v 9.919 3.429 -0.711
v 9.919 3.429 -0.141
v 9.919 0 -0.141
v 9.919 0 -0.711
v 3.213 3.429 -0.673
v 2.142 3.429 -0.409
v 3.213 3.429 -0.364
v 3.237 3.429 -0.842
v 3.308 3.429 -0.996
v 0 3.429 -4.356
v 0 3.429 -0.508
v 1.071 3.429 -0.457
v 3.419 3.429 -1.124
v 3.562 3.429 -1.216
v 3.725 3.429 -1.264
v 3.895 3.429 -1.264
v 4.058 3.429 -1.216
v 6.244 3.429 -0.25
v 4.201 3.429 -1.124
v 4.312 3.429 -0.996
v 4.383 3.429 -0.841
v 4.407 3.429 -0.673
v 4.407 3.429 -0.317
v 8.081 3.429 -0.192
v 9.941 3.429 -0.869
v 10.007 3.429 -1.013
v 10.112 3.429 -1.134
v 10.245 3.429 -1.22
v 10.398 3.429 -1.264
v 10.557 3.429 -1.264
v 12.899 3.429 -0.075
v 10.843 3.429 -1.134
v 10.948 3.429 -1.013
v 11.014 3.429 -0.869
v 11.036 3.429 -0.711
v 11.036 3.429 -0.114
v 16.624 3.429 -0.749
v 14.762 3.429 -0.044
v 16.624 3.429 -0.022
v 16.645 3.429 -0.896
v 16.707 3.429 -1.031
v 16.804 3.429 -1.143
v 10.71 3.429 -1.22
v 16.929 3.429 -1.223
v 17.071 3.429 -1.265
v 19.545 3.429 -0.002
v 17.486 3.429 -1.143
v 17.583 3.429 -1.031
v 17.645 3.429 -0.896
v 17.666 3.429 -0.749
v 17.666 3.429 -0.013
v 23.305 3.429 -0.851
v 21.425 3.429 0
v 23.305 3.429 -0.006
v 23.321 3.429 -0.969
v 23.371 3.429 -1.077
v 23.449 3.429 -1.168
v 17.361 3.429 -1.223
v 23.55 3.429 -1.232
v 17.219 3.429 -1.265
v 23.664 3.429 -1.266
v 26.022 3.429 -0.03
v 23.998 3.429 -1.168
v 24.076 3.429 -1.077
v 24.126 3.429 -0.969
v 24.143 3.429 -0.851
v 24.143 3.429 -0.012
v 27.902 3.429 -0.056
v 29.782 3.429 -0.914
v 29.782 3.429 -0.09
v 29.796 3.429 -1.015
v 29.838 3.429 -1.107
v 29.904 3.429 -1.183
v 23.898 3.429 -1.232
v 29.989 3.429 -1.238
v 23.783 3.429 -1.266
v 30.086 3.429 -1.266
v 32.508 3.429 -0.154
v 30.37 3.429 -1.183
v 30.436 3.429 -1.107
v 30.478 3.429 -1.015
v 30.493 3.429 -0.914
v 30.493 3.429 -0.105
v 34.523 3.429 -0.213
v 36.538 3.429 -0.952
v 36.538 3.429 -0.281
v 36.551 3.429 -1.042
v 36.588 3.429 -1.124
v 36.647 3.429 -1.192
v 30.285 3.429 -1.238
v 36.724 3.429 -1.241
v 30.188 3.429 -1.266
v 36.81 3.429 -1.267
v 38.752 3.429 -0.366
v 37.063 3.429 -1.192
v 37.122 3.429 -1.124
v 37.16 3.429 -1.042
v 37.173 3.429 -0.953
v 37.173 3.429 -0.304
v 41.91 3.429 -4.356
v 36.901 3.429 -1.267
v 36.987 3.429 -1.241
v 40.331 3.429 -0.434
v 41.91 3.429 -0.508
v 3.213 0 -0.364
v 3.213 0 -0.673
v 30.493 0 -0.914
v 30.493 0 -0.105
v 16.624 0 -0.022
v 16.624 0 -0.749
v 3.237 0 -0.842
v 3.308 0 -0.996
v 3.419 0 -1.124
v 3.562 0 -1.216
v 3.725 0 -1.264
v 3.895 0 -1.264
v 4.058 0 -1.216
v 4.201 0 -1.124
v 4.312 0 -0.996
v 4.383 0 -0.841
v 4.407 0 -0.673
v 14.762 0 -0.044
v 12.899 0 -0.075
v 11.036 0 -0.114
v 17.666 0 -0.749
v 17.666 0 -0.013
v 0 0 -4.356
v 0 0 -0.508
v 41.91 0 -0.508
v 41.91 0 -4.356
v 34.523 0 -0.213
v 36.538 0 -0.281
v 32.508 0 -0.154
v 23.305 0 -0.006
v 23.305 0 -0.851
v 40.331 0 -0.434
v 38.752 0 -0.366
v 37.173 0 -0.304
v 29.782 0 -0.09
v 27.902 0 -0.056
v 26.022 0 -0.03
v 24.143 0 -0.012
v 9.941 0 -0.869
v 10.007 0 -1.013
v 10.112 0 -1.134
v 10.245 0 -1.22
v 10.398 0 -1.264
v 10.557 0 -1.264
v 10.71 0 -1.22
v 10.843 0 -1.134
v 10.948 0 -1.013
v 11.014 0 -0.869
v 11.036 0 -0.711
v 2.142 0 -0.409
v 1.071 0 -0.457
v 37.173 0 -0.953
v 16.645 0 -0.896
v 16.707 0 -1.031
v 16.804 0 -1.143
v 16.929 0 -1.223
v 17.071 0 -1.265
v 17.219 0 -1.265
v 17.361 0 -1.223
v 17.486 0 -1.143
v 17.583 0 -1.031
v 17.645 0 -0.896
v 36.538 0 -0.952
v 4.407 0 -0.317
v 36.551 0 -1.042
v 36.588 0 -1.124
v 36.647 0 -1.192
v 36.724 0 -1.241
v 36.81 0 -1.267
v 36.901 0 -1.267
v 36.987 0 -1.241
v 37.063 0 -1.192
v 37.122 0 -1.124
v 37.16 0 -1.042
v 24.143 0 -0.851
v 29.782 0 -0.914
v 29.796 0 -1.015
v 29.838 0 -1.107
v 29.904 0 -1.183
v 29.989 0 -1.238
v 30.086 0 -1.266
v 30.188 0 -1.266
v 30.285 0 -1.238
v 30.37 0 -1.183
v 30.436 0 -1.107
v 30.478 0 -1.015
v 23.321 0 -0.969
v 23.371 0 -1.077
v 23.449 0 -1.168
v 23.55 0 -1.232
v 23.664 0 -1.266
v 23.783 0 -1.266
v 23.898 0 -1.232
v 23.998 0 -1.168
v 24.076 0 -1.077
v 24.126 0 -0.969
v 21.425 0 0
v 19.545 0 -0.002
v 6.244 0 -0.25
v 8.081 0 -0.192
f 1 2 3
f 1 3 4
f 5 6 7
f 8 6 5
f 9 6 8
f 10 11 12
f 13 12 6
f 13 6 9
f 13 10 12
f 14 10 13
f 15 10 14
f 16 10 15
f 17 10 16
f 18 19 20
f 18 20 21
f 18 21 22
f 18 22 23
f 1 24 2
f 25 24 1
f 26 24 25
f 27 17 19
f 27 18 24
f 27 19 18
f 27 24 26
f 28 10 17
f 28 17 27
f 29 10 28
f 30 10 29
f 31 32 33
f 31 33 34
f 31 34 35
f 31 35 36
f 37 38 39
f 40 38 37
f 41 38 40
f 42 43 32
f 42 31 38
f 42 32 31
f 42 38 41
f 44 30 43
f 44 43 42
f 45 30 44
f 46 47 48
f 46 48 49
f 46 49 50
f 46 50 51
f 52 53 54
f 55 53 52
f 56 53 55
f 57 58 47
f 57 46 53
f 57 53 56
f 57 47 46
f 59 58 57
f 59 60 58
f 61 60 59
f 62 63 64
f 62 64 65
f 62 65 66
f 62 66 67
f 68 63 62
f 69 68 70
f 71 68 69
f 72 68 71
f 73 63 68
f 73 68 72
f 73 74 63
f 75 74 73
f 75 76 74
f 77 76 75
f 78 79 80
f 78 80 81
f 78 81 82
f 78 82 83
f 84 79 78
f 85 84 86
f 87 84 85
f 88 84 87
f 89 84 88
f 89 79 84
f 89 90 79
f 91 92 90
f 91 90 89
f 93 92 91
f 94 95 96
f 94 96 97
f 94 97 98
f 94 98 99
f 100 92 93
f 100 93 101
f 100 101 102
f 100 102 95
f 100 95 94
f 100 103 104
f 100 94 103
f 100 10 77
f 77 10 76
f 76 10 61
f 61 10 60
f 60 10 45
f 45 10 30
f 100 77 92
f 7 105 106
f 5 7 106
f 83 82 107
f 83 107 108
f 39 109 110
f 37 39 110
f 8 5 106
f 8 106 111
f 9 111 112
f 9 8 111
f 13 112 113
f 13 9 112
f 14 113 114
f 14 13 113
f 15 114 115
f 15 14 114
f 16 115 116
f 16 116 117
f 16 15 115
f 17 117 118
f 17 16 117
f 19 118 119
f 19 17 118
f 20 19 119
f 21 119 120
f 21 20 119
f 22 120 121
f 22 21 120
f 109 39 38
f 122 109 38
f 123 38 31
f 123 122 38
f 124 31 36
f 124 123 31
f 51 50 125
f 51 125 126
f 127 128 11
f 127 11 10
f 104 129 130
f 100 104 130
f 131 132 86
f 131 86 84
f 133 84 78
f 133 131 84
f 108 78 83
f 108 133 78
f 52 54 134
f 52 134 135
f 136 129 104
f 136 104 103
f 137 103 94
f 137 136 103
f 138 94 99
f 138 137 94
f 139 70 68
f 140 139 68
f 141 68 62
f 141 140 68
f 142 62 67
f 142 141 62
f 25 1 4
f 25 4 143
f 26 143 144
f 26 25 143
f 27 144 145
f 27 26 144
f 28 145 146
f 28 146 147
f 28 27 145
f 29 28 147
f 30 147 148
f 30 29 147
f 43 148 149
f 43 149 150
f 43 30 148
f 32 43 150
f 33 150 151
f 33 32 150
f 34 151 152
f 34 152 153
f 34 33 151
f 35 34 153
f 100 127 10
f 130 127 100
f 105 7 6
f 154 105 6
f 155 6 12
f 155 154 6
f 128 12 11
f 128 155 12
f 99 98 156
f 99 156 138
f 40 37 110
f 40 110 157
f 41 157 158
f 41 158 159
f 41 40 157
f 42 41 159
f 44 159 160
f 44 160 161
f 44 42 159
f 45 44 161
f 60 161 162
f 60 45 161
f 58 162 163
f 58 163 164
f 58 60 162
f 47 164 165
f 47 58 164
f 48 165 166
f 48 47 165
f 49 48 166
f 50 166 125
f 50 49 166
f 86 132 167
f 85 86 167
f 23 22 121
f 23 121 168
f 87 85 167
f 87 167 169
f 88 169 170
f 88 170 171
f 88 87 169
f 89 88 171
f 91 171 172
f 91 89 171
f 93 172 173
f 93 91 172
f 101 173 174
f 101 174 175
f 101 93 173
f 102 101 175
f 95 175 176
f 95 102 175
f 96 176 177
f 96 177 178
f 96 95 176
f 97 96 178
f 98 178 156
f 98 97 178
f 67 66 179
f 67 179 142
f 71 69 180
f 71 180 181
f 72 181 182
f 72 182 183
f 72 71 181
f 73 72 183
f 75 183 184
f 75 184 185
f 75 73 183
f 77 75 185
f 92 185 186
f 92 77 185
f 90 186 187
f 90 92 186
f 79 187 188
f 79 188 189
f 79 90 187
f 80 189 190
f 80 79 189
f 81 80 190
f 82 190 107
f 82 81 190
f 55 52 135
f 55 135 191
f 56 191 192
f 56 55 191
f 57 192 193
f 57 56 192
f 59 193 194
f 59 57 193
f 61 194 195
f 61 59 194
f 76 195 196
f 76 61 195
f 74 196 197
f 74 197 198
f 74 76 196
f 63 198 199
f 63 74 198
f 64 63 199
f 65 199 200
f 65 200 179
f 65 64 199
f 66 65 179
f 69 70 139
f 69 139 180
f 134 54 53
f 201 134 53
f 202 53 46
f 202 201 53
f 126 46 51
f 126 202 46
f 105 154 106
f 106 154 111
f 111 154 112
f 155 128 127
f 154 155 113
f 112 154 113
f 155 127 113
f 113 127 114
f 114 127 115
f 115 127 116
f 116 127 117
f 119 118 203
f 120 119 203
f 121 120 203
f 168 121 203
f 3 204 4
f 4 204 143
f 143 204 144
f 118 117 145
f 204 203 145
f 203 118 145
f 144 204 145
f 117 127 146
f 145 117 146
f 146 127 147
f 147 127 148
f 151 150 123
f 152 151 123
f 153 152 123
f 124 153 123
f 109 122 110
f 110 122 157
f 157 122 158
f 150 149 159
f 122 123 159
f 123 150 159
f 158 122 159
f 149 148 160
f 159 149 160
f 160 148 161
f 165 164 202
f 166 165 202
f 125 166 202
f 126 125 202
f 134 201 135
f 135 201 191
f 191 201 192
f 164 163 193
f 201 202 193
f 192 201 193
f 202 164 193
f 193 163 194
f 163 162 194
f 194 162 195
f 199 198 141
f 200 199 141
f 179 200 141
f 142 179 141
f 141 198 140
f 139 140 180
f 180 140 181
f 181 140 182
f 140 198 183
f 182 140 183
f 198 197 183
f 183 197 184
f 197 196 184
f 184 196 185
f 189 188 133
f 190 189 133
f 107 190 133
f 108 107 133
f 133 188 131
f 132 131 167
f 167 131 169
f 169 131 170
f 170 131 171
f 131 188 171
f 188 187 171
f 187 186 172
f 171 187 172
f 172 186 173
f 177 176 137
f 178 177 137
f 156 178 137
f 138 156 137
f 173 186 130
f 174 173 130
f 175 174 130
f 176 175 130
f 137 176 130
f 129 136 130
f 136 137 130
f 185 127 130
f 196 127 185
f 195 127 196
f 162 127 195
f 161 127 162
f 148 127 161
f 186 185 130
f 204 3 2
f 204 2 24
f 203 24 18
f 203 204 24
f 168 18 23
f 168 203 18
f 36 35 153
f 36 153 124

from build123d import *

# Parameters (mm, degrees)
SKETCH1_W           = 41.91
SKETCH1_H           = 4.3561
BOSS_EXTRUDE1_DEPTH = 3.429
CUT_EXTRUDE1_DEPTH  = 3.429
CUT_EXTRUDE2_START  = -3.429
CUT_EXTRUDE2_DEPTH  = 3.429


with BuildPart() as part:
    # Sketch1 → Boss-Extrude1 (new body)
    with BuildSketch(Plane(origin=(0, 0, 0), x_dir=(1, 0, 0), z_dir=(0, 1, 0))):
        with Locations((20.955, 2.17805)):
            Rectangle(SKETCH1_W, SKETCH1_H)
    extrude(amount=BOSS_EXTRUDE1_DEPTH)

    # Sketch3 → Cut-Extrude1 (cut)
    with BuildSketch(Plane(origin=(0, 3.429, 0), x_dir=(1, 0, 0), z_dir=(0, 1, 0))):
        with BuildLine():
            Line((3.2131, 0), (3.2131, 0.673406365))
            ThreePointArc((3.2131, 0.673406365), (3.810306846, 1.27), (4.406900482, 0.672793154))
            Line((4.406900482, 0.672793154), (4.406900482, 0))
            Line((4.406900482, 0), (3.2131, 0))
        make_face()
        with BuildLine():
            Line((9.918700482, 0), (9.918700482, 0.7112))
            ThreePointArc((9.918700482, 0.7112), (10.477500482, 1.27), (11.036300482, 0.7112))
            Line((11.036300482, 0.7112), (11.036300482, 0))
            Line((11.036300482, 0), (9.918700482, 0))
        make_face()
        with BuildLine():
            Line((16.624300482, 0), (16.624300482, 0.7493))
            ThreePointArc((16.624300482, 0.7493), (17.145000482, 1.27), (17.665700482, 0.7493))
            Line((17.665700482, 0.7493), (17.665700482, 0))
            Line((17.665700482, 0), (16.624300482, 0))
        make_face()
        with BuildLine():
            Line((23.304500482, 0), (23.304500482, 0.8509))
            ThreePointArc((23.304500482, 0.8509), (23.723600482, 1.27), (24.142700482, 0.8509))
            Line((24.142700482, 0.8509), (24.142700482, 0))
            Line((24.142700482, 0), (23.304500482, 0))
        make_face()
        with BuildLine():
            Line((29.781500482, 0), (29.781500482, 0.9144))
            ThreePointArc((29.781500482, 0.9144), (30.137100482, 1.27), (30.492700482, 0.9144))
            Line((30.492700482, 0.9144), (30.492700482, 0))
            Line((30.492700482, 0), (29.781500482, 0))
        make_face()
        with BuildLine():
            Line((36.537900482, 0), (36.537900482, 0.9525))
            ThreePointArc((36.537900482, 0.9525), (36.855400482, 1.27), (37.172900482, 0.9525))
            Line((37.172900482, 0.9525), (37.172900482, 0))
            Line((37.172900482, 0), (36.537900482, 0))
        make_face()
    extrude(amount=-CUT_EXTRUDE1_DEPTH, mode=Mode.SUBTRACT)

    # Sketch4 → Cut-Extrude2 (cut)
    with BuildSketch(Plane(origin=(0, 3.429, 0), x_dir=(1, 0, 0), z_dir=(0, 1, 0)).offset(CUT_EXTRUDE2_START)):
        with BuildLine():
            Line((0, 0.508), (0, -0.53864271))
            Line((0, -0.53864271), (41.91, -0.53864271))
            Line((41.91, -0.53864271), (41.91, 0.508))
            ThreePointArc((41.91, 0.508), (20.955, 0), (0, 0.508))
        make_face()
    extrude(amount=CUT_EXTRUDE2_DEPTH, mode=Mode.SUBTRACT)


solid = part.part
